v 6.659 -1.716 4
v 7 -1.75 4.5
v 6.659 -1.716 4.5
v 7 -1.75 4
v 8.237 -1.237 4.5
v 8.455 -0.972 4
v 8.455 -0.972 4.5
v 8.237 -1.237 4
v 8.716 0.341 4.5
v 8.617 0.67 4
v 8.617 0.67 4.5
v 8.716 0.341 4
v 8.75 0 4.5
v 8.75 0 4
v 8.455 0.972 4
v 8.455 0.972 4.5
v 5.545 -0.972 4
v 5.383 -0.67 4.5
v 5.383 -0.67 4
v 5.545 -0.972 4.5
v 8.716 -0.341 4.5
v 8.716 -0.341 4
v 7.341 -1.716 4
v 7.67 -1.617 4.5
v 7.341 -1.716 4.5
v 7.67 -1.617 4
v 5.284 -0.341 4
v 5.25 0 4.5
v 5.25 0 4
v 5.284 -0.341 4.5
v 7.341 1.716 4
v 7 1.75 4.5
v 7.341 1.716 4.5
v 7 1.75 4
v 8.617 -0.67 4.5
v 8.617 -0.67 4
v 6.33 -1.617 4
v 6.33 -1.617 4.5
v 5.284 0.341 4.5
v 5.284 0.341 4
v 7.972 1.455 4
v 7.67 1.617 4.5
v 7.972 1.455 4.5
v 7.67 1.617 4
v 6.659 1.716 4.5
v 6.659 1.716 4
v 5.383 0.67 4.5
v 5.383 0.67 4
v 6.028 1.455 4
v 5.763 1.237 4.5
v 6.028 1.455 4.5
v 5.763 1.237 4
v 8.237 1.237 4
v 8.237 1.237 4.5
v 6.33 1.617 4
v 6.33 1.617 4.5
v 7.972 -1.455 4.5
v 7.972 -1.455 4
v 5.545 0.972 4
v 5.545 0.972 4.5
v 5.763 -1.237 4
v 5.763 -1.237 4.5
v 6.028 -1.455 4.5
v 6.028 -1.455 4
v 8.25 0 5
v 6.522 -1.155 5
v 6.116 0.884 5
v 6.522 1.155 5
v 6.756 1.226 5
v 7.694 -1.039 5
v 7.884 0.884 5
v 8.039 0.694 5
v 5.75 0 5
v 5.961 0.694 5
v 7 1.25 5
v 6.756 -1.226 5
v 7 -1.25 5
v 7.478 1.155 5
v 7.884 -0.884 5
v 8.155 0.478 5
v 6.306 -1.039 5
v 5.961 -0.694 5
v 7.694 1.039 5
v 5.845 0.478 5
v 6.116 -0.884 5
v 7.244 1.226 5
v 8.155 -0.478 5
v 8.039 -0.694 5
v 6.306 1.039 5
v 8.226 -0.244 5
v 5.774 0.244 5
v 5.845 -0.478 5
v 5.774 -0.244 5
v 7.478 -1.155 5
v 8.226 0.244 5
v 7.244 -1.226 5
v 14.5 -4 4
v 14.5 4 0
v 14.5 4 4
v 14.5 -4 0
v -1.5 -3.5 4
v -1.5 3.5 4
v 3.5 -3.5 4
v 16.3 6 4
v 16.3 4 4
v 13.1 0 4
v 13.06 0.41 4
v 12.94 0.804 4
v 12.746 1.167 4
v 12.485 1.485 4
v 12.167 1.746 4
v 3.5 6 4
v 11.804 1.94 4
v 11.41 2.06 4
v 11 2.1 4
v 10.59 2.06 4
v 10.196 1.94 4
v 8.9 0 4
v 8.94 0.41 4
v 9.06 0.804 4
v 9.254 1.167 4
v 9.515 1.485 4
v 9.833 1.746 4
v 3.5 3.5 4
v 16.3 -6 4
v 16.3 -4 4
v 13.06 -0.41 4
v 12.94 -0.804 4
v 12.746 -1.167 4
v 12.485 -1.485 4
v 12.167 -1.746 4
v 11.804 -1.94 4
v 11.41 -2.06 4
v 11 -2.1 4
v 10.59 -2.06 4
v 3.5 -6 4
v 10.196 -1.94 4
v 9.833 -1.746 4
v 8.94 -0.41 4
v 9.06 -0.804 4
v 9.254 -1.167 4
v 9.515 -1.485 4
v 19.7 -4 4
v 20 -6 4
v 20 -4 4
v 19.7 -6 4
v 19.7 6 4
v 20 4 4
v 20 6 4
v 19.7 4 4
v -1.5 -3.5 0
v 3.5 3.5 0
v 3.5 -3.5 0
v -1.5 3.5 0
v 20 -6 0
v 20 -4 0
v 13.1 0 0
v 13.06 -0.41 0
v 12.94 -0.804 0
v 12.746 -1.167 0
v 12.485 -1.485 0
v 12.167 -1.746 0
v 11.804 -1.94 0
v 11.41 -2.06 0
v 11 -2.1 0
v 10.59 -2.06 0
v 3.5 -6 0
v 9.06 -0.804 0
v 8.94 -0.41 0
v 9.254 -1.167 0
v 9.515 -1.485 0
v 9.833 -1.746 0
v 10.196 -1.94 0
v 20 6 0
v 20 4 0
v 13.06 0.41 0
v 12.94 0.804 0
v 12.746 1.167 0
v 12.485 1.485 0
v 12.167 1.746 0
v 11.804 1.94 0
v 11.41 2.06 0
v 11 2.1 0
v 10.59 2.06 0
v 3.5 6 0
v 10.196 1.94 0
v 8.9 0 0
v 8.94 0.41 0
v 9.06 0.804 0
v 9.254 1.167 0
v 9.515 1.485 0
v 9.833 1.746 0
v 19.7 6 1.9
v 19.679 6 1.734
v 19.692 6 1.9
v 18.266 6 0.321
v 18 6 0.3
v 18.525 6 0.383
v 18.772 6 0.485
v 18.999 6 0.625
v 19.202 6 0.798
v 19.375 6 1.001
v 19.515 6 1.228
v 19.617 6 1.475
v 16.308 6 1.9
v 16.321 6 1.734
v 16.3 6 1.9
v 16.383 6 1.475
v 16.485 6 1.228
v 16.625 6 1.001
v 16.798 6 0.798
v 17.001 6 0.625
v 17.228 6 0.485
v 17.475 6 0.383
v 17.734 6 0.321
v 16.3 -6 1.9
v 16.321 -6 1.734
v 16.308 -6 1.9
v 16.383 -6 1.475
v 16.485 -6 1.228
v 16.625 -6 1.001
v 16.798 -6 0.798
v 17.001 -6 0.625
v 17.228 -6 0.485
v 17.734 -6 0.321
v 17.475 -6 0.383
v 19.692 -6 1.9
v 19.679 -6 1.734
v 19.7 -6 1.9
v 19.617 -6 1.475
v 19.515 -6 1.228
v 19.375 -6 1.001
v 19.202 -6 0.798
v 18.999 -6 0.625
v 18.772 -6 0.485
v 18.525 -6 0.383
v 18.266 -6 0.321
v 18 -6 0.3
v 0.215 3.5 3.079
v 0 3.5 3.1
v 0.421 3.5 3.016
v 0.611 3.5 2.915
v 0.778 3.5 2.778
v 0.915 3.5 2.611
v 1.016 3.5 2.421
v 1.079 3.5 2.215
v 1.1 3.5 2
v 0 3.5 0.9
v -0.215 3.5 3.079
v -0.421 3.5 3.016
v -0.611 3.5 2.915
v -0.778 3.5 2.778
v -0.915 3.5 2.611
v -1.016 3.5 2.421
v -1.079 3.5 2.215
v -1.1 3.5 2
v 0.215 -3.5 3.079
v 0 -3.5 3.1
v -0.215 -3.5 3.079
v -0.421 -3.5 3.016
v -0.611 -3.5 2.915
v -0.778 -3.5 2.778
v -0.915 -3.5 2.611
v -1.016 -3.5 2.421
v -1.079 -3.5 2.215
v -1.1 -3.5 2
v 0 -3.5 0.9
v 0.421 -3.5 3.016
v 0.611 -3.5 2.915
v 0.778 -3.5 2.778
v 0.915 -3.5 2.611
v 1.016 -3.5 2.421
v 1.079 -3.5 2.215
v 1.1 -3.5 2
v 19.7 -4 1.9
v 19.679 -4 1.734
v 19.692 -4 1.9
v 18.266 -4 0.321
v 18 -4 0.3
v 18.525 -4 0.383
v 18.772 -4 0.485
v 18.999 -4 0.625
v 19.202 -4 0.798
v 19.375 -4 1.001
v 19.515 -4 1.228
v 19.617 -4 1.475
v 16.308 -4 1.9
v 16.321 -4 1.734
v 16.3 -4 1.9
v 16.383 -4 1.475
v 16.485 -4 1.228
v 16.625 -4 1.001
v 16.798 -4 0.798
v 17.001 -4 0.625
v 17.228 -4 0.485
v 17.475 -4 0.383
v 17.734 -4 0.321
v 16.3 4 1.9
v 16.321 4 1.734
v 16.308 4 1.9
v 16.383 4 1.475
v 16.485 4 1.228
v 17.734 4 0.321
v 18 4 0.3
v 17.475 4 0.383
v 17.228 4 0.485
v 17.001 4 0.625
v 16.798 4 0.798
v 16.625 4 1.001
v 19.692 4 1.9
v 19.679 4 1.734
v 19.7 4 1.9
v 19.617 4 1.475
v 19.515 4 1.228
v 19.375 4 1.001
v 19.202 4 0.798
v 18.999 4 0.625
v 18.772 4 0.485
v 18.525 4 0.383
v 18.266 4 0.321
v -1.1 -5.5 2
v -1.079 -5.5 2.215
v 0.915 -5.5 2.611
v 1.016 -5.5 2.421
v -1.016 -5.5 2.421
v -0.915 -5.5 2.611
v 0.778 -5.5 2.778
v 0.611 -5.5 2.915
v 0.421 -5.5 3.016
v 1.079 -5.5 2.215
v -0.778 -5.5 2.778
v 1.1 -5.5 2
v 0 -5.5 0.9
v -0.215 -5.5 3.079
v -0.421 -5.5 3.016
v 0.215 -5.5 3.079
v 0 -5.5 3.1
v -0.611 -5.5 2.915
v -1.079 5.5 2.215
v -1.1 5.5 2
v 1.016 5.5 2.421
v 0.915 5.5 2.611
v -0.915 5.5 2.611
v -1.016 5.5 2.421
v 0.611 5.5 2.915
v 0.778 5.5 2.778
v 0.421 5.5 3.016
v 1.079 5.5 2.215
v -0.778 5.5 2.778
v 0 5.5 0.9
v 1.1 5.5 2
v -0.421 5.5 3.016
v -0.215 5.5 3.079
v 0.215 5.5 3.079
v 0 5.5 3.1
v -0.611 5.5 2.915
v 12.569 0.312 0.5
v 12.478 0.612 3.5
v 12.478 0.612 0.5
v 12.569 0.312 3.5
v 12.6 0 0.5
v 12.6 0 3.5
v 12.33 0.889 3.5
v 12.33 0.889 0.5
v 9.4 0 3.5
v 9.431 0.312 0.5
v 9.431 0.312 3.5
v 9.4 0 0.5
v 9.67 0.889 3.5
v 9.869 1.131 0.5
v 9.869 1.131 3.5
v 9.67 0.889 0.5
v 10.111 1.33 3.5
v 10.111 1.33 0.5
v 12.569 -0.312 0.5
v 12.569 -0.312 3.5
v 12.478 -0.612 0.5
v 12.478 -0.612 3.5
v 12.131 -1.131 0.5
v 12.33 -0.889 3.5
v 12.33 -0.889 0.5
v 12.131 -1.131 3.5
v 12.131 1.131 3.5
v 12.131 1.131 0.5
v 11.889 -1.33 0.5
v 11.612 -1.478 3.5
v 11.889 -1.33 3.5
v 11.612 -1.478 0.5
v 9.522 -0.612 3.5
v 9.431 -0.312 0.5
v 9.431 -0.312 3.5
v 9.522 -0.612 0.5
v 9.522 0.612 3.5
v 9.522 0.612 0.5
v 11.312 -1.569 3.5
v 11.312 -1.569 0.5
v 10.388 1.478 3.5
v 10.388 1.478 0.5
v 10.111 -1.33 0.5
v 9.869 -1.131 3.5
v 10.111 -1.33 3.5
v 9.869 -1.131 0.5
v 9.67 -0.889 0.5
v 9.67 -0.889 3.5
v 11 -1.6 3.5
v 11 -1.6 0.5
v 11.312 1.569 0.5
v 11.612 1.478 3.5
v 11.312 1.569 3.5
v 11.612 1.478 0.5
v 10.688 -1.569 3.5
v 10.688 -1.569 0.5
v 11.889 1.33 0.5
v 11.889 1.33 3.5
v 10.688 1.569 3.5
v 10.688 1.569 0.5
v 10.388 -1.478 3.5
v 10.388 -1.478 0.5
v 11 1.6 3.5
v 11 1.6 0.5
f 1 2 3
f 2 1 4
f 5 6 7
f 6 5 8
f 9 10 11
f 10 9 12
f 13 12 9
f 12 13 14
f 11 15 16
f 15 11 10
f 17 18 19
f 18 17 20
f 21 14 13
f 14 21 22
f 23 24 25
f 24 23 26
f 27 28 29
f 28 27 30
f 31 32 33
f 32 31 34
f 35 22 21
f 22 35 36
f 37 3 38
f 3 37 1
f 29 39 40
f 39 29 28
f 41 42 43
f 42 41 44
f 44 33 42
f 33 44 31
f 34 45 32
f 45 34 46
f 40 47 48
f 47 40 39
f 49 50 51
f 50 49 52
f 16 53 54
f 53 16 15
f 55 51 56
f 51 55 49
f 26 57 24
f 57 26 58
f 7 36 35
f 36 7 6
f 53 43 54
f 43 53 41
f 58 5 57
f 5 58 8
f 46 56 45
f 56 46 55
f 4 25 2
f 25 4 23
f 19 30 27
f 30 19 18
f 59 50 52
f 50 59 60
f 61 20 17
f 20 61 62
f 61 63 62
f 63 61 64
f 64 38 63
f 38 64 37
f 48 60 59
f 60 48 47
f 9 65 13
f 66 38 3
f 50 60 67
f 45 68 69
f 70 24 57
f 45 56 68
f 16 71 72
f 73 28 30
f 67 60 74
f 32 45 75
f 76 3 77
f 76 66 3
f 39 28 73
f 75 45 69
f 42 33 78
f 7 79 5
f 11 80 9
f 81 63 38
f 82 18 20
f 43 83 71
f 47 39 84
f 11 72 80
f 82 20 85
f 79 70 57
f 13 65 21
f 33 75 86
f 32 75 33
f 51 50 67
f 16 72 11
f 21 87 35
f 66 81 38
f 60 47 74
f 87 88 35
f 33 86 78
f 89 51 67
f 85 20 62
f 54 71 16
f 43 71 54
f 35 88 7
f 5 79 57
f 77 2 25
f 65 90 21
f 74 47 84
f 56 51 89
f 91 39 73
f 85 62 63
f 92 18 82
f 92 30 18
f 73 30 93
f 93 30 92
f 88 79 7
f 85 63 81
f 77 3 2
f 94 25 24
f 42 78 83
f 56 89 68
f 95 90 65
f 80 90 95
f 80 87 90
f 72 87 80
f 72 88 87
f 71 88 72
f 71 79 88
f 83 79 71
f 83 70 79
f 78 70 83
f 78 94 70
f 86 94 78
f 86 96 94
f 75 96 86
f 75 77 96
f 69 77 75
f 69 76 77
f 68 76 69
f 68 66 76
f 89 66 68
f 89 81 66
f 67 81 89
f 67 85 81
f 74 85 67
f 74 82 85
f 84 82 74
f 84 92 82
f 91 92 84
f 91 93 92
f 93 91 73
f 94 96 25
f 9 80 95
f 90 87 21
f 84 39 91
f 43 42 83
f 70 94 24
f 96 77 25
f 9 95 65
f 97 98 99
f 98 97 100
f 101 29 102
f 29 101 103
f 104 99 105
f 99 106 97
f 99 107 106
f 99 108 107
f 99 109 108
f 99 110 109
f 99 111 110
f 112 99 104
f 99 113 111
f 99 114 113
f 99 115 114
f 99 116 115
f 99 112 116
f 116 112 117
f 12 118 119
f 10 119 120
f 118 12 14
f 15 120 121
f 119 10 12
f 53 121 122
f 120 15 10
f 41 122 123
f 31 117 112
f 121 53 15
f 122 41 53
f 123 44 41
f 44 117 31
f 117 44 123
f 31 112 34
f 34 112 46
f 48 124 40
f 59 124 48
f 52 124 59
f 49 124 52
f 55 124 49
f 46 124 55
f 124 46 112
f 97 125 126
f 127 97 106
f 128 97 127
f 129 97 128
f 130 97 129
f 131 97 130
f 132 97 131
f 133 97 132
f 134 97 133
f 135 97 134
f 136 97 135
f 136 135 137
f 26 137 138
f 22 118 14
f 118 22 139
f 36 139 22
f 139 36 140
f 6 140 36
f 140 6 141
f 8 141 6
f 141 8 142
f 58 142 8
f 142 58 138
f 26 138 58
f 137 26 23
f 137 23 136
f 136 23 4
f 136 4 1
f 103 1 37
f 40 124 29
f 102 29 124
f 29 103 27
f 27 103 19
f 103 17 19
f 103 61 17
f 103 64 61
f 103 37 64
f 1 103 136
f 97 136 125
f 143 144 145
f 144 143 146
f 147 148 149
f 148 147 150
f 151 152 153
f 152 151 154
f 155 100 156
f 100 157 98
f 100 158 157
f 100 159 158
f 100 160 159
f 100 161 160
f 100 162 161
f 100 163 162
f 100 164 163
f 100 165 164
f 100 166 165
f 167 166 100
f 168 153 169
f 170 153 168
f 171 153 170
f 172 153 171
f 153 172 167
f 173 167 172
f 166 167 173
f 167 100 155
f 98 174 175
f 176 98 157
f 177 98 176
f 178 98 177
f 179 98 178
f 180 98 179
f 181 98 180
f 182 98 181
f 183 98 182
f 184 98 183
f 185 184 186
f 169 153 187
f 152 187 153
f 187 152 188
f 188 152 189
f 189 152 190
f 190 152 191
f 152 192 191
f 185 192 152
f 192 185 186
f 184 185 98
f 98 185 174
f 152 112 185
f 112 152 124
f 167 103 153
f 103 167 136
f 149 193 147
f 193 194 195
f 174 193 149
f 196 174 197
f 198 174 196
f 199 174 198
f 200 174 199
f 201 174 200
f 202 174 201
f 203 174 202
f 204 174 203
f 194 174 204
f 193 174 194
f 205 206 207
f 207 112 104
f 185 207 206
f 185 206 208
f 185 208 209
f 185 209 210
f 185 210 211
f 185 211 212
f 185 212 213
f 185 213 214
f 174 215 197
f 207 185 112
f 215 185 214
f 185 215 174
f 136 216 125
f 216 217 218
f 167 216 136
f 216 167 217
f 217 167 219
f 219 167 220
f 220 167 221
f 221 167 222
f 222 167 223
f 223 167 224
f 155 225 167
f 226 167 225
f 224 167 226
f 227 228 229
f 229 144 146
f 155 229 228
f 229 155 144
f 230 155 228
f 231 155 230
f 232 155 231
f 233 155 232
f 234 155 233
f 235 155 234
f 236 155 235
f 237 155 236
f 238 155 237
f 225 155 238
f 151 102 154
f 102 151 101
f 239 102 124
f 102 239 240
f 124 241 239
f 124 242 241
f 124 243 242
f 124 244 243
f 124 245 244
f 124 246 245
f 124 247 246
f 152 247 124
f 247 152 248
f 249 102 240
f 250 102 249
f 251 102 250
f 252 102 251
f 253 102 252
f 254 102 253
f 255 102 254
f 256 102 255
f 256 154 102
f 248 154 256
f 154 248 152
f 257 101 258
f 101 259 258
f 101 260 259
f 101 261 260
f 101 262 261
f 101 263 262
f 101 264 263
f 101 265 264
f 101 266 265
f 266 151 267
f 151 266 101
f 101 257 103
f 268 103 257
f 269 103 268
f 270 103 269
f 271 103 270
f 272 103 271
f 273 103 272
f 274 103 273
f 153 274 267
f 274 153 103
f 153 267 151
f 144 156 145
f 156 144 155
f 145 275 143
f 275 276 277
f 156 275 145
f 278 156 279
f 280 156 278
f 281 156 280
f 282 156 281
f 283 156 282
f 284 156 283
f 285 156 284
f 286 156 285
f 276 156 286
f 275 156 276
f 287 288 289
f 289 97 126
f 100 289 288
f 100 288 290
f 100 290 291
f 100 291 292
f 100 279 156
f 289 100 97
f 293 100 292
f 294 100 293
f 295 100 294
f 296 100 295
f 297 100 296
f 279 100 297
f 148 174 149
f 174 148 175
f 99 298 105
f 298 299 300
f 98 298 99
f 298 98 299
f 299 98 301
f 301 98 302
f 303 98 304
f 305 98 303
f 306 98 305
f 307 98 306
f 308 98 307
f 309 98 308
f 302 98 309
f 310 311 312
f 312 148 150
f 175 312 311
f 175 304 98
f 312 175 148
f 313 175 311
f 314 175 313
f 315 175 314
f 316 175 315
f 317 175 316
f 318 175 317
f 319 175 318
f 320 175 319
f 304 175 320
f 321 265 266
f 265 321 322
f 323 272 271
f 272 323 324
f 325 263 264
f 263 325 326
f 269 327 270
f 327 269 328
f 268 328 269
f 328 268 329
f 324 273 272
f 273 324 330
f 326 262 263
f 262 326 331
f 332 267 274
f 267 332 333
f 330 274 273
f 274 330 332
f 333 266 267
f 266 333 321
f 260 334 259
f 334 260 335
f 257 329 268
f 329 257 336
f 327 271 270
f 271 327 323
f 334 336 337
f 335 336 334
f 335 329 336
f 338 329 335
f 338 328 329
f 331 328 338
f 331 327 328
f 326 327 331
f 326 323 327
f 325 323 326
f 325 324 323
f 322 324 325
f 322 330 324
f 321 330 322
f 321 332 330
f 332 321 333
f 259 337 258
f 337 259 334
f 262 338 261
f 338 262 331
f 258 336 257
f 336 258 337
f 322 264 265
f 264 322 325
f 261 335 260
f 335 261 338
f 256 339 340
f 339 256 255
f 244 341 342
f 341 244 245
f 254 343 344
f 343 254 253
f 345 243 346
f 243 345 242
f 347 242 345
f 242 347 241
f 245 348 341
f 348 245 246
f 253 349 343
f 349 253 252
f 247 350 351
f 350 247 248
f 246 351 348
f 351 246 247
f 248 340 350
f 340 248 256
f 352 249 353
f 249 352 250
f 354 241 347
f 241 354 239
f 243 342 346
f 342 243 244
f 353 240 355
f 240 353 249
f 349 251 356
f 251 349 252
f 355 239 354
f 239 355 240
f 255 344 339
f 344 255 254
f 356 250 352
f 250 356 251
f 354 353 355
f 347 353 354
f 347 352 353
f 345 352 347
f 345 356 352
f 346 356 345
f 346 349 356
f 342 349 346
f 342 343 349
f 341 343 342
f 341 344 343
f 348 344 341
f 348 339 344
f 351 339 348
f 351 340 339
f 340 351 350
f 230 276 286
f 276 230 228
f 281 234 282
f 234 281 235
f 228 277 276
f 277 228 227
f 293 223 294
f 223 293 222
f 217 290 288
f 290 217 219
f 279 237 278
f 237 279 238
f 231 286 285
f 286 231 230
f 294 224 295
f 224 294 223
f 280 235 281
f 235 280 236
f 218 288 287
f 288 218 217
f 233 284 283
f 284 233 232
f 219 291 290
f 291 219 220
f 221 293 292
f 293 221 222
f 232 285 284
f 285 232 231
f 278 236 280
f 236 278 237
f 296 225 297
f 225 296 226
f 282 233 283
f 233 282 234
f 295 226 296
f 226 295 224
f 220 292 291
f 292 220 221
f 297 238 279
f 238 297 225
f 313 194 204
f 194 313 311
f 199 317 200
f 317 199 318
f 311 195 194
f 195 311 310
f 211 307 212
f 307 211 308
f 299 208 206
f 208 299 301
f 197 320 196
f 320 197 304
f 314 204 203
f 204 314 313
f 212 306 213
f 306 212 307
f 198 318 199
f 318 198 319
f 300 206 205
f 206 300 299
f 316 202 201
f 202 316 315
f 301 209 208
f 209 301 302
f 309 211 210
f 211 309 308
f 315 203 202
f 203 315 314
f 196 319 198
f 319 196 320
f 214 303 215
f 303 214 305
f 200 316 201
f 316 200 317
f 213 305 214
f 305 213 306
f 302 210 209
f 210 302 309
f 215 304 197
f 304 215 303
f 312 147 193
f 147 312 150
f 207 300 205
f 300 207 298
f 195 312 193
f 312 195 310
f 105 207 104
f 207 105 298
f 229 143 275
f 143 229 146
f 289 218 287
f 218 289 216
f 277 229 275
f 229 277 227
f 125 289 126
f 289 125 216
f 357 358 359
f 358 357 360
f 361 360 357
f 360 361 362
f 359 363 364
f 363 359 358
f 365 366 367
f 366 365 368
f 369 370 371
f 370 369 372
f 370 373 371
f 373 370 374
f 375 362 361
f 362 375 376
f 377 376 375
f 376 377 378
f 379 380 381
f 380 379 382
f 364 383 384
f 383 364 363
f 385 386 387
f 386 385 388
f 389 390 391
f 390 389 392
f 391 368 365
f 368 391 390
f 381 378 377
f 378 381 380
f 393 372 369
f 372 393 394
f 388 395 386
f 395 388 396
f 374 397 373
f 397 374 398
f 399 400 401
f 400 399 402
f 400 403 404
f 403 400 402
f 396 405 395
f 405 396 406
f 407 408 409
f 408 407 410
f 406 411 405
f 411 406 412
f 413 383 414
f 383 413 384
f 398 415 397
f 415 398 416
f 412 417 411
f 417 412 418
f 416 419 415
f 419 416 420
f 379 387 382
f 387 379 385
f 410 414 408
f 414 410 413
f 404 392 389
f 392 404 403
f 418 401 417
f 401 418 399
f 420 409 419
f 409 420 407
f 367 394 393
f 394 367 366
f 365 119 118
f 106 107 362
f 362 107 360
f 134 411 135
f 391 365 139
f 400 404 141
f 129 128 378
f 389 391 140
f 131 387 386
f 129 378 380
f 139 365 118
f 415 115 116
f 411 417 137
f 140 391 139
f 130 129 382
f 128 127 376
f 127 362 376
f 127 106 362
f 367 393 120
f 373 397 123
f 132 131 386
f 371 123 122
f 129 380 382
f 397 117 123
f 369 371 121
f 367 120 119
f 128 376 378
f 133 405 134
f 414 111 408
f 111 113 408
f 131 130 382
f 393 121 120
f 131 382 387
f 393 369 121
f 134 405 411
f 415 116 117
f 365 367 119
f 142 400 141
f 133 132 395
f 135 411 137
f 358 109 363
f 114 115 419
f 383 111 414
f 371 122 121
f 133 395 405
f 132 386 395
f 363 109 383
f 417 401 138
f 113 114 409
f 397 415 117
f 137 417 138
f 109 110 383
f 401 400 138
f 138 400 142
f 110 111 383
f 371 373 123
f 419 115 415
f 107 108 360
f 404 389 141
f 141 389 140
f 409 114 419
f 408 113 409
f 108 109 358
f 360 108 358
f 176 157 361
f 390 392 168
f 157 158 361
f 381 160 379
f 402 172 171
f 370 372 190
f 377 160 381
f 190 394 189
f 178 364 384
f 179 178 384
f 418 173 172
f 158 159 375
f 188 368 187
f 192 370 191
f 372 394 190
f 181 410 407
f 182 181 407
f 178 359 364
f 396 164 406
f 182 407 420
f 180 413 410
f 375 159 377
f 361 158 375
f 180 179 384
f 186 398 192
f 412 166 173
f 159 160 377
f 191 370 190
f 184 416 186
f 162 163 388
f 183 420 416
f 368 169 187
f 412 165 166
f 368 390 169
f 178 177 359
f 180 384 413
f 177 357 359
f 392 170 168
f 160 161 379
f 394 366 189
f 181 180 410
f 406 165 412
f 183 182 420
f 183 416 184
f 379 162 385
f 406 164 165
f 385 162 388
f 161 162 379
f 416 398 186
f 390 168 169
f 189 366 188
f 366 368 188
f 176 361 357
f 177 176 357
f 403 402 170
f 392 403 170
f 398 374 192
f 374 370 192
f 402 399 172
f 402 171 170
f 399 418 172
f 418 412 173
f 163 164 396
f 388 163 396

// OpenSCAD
// Bracelet of hinged links, printed in place (3-link sample of a 10-link chain)
part = "link"; // [link, assembly]
cadverify_only = "";
module instance(name, part, unit = 1) {
    echo(cadverify_instance = [name, part, unit]);
    if (cadverify_only == "" || cadverify_only == name) children();
}
// link: pitch 18 (X), width 12 (Y), body 4 thick + 1 snap stud = 5
// hinge: teardrop pin (r1.1) in U-cradle (r1.7, open at top), 0.6 clearance
P = 18; W = 12; Zc = 2.0;
Rp = 1.1; Rh = 1.7; SlotH = 1.7;
Ytong = 3.5;
Xrear = -1.5; Xsr = 3.5; Xsf = 14.5; Xlr = 13.5; Xfront = 20;
XpinF = 18;
studX = 7; studR = 1.75;
holeX = 11; holeR = 1.6;
module teardrop2D() {
    pts = concat([for (a=[0:180/16:180]) [Rp*cos(a), Zc+Rp*sin(a)]], [[0, Zc-Rp]]);
    polygon(pts);
}
module pin_stub(len) { linear_extrude(height=len) teardrop2D(); }
module stud_solid() {
    translate([studX, 0, 3.9]) cylinder(r=studR, h=0.6, $fn=32);
    translate([studX, 0, 4.5]) cylinder(r1=studR, r2=1.25, h=0.5, $fn=32);
}
module link() {
    difference() {
        union() {
            translate([Xsr, -6, 0]) cube([Xsf-Xsr, 12, 4]);
            translate([Xrear, -Ytong, 0]) cube([(4.5-Xrear), 7, 4]);
            translate([Xlr, -6, 0]) cube([Xfront-Xlr, 2, 4]);
            translate([Xlr, 4, 0]) cube([Xfront-Xlr, 2, 4]);
            translate([0, -2.5, 0]) rotate([90,0,0]) pin_stub(3.0);
            translate([0, 5.5, 0]) rotate([90,0,0]) pin_stub(3.0);
            stud_solid();
        }
        translate([XpinF, -6.1, Zc]) rotate([-90,0,0]) cylinder(r=Rh, h=2.2, $fn=40);
        translate([XpinF, 3.9, Zc]) rotate([-90,0,0]) cylinder(r=Rh, h=2.2, $fn=40);
        translate([XpinF-SlotH, 3.9, 1.9]) cube([2*SlotH, 2.2, 2.2]);
        translate([XpinF-SlotH, -6.1, 1.9]) cube([2*SlotH, 2.2, 2.2]);
        translate([holeX, 0, -0.1]) cylinder(r=holeR, h=4.2, $fn=32);
        translate([holeX, 0, 3.5]) cylinder(r1=holeR, r2=2.1, h=0.5, $fn=32);
        translate([holeX, 0, 0]) cylinder(r1=2.1, r2=holeR, h=0.5, $fn=32);
    }
}
if (part == "assembly") {
    echo(cadverify_spec = [
        ["bounds", [[-1.5, -6, 0], [56, 6, 5]]],
        ["support_faces", [["bed", "-z", 300]]],
        ["allowed_interferences", []],
        ["motions", [["joint_bend", ["link3"], "rotate", [36, 0, 2], [0, 1, 0], [-30, 30]]]],
        ["assembly_order", [[["link1"], [0, 0, 0]], [["link2"], [0, 0, -1]], [["link3"], [0, 0, -1]]]],
        ["print_in_place", 0.5],
        ["overhangs_allowed", []]
    ]);
    instance("link1", "link", 1) translate([0, 0, 0]) link();
    instance("link2", "link", 1) translate([18, 0, 0]) link();
    instance("link3", "link", 1) translate([36, 0, 0]) link();
} else {
    echo(cadverify_spec = [
        ["bounds", [[-1.5, -6, 0], [20, 6, 5]]],
        ["bodies", 1],
        ["through_holes", 1],
        ["support_faces", [["bed", "-z", 100]]],
        ["overhangs_allowed", []],
        ["copies", 3],
        ["details", [
            ["spine", "material", [[5, -5, 0], [9, 5, 4]], 0.9],
            ["slot", "void", [[14.5, -4, 0], [20, 4, 4]], 0.9],
            ["cradle", "void", [[16.3, 4, 1.9], [19.7, 6.1, 4.1]], 0.9],
            ["snap_hole", "hole", [11, 0, 6], [0, 0, -1], [[0, 4.2], [0.5, 3.2], [3.5, 3.2]]],
            ["floor", "thickness", [9, 3, -1], [0, 0, 1], 4],
            ["snap", "view", [[5, -2, 4], [9, 2, 5]]]
        ]]
    ]);
    link();
}
